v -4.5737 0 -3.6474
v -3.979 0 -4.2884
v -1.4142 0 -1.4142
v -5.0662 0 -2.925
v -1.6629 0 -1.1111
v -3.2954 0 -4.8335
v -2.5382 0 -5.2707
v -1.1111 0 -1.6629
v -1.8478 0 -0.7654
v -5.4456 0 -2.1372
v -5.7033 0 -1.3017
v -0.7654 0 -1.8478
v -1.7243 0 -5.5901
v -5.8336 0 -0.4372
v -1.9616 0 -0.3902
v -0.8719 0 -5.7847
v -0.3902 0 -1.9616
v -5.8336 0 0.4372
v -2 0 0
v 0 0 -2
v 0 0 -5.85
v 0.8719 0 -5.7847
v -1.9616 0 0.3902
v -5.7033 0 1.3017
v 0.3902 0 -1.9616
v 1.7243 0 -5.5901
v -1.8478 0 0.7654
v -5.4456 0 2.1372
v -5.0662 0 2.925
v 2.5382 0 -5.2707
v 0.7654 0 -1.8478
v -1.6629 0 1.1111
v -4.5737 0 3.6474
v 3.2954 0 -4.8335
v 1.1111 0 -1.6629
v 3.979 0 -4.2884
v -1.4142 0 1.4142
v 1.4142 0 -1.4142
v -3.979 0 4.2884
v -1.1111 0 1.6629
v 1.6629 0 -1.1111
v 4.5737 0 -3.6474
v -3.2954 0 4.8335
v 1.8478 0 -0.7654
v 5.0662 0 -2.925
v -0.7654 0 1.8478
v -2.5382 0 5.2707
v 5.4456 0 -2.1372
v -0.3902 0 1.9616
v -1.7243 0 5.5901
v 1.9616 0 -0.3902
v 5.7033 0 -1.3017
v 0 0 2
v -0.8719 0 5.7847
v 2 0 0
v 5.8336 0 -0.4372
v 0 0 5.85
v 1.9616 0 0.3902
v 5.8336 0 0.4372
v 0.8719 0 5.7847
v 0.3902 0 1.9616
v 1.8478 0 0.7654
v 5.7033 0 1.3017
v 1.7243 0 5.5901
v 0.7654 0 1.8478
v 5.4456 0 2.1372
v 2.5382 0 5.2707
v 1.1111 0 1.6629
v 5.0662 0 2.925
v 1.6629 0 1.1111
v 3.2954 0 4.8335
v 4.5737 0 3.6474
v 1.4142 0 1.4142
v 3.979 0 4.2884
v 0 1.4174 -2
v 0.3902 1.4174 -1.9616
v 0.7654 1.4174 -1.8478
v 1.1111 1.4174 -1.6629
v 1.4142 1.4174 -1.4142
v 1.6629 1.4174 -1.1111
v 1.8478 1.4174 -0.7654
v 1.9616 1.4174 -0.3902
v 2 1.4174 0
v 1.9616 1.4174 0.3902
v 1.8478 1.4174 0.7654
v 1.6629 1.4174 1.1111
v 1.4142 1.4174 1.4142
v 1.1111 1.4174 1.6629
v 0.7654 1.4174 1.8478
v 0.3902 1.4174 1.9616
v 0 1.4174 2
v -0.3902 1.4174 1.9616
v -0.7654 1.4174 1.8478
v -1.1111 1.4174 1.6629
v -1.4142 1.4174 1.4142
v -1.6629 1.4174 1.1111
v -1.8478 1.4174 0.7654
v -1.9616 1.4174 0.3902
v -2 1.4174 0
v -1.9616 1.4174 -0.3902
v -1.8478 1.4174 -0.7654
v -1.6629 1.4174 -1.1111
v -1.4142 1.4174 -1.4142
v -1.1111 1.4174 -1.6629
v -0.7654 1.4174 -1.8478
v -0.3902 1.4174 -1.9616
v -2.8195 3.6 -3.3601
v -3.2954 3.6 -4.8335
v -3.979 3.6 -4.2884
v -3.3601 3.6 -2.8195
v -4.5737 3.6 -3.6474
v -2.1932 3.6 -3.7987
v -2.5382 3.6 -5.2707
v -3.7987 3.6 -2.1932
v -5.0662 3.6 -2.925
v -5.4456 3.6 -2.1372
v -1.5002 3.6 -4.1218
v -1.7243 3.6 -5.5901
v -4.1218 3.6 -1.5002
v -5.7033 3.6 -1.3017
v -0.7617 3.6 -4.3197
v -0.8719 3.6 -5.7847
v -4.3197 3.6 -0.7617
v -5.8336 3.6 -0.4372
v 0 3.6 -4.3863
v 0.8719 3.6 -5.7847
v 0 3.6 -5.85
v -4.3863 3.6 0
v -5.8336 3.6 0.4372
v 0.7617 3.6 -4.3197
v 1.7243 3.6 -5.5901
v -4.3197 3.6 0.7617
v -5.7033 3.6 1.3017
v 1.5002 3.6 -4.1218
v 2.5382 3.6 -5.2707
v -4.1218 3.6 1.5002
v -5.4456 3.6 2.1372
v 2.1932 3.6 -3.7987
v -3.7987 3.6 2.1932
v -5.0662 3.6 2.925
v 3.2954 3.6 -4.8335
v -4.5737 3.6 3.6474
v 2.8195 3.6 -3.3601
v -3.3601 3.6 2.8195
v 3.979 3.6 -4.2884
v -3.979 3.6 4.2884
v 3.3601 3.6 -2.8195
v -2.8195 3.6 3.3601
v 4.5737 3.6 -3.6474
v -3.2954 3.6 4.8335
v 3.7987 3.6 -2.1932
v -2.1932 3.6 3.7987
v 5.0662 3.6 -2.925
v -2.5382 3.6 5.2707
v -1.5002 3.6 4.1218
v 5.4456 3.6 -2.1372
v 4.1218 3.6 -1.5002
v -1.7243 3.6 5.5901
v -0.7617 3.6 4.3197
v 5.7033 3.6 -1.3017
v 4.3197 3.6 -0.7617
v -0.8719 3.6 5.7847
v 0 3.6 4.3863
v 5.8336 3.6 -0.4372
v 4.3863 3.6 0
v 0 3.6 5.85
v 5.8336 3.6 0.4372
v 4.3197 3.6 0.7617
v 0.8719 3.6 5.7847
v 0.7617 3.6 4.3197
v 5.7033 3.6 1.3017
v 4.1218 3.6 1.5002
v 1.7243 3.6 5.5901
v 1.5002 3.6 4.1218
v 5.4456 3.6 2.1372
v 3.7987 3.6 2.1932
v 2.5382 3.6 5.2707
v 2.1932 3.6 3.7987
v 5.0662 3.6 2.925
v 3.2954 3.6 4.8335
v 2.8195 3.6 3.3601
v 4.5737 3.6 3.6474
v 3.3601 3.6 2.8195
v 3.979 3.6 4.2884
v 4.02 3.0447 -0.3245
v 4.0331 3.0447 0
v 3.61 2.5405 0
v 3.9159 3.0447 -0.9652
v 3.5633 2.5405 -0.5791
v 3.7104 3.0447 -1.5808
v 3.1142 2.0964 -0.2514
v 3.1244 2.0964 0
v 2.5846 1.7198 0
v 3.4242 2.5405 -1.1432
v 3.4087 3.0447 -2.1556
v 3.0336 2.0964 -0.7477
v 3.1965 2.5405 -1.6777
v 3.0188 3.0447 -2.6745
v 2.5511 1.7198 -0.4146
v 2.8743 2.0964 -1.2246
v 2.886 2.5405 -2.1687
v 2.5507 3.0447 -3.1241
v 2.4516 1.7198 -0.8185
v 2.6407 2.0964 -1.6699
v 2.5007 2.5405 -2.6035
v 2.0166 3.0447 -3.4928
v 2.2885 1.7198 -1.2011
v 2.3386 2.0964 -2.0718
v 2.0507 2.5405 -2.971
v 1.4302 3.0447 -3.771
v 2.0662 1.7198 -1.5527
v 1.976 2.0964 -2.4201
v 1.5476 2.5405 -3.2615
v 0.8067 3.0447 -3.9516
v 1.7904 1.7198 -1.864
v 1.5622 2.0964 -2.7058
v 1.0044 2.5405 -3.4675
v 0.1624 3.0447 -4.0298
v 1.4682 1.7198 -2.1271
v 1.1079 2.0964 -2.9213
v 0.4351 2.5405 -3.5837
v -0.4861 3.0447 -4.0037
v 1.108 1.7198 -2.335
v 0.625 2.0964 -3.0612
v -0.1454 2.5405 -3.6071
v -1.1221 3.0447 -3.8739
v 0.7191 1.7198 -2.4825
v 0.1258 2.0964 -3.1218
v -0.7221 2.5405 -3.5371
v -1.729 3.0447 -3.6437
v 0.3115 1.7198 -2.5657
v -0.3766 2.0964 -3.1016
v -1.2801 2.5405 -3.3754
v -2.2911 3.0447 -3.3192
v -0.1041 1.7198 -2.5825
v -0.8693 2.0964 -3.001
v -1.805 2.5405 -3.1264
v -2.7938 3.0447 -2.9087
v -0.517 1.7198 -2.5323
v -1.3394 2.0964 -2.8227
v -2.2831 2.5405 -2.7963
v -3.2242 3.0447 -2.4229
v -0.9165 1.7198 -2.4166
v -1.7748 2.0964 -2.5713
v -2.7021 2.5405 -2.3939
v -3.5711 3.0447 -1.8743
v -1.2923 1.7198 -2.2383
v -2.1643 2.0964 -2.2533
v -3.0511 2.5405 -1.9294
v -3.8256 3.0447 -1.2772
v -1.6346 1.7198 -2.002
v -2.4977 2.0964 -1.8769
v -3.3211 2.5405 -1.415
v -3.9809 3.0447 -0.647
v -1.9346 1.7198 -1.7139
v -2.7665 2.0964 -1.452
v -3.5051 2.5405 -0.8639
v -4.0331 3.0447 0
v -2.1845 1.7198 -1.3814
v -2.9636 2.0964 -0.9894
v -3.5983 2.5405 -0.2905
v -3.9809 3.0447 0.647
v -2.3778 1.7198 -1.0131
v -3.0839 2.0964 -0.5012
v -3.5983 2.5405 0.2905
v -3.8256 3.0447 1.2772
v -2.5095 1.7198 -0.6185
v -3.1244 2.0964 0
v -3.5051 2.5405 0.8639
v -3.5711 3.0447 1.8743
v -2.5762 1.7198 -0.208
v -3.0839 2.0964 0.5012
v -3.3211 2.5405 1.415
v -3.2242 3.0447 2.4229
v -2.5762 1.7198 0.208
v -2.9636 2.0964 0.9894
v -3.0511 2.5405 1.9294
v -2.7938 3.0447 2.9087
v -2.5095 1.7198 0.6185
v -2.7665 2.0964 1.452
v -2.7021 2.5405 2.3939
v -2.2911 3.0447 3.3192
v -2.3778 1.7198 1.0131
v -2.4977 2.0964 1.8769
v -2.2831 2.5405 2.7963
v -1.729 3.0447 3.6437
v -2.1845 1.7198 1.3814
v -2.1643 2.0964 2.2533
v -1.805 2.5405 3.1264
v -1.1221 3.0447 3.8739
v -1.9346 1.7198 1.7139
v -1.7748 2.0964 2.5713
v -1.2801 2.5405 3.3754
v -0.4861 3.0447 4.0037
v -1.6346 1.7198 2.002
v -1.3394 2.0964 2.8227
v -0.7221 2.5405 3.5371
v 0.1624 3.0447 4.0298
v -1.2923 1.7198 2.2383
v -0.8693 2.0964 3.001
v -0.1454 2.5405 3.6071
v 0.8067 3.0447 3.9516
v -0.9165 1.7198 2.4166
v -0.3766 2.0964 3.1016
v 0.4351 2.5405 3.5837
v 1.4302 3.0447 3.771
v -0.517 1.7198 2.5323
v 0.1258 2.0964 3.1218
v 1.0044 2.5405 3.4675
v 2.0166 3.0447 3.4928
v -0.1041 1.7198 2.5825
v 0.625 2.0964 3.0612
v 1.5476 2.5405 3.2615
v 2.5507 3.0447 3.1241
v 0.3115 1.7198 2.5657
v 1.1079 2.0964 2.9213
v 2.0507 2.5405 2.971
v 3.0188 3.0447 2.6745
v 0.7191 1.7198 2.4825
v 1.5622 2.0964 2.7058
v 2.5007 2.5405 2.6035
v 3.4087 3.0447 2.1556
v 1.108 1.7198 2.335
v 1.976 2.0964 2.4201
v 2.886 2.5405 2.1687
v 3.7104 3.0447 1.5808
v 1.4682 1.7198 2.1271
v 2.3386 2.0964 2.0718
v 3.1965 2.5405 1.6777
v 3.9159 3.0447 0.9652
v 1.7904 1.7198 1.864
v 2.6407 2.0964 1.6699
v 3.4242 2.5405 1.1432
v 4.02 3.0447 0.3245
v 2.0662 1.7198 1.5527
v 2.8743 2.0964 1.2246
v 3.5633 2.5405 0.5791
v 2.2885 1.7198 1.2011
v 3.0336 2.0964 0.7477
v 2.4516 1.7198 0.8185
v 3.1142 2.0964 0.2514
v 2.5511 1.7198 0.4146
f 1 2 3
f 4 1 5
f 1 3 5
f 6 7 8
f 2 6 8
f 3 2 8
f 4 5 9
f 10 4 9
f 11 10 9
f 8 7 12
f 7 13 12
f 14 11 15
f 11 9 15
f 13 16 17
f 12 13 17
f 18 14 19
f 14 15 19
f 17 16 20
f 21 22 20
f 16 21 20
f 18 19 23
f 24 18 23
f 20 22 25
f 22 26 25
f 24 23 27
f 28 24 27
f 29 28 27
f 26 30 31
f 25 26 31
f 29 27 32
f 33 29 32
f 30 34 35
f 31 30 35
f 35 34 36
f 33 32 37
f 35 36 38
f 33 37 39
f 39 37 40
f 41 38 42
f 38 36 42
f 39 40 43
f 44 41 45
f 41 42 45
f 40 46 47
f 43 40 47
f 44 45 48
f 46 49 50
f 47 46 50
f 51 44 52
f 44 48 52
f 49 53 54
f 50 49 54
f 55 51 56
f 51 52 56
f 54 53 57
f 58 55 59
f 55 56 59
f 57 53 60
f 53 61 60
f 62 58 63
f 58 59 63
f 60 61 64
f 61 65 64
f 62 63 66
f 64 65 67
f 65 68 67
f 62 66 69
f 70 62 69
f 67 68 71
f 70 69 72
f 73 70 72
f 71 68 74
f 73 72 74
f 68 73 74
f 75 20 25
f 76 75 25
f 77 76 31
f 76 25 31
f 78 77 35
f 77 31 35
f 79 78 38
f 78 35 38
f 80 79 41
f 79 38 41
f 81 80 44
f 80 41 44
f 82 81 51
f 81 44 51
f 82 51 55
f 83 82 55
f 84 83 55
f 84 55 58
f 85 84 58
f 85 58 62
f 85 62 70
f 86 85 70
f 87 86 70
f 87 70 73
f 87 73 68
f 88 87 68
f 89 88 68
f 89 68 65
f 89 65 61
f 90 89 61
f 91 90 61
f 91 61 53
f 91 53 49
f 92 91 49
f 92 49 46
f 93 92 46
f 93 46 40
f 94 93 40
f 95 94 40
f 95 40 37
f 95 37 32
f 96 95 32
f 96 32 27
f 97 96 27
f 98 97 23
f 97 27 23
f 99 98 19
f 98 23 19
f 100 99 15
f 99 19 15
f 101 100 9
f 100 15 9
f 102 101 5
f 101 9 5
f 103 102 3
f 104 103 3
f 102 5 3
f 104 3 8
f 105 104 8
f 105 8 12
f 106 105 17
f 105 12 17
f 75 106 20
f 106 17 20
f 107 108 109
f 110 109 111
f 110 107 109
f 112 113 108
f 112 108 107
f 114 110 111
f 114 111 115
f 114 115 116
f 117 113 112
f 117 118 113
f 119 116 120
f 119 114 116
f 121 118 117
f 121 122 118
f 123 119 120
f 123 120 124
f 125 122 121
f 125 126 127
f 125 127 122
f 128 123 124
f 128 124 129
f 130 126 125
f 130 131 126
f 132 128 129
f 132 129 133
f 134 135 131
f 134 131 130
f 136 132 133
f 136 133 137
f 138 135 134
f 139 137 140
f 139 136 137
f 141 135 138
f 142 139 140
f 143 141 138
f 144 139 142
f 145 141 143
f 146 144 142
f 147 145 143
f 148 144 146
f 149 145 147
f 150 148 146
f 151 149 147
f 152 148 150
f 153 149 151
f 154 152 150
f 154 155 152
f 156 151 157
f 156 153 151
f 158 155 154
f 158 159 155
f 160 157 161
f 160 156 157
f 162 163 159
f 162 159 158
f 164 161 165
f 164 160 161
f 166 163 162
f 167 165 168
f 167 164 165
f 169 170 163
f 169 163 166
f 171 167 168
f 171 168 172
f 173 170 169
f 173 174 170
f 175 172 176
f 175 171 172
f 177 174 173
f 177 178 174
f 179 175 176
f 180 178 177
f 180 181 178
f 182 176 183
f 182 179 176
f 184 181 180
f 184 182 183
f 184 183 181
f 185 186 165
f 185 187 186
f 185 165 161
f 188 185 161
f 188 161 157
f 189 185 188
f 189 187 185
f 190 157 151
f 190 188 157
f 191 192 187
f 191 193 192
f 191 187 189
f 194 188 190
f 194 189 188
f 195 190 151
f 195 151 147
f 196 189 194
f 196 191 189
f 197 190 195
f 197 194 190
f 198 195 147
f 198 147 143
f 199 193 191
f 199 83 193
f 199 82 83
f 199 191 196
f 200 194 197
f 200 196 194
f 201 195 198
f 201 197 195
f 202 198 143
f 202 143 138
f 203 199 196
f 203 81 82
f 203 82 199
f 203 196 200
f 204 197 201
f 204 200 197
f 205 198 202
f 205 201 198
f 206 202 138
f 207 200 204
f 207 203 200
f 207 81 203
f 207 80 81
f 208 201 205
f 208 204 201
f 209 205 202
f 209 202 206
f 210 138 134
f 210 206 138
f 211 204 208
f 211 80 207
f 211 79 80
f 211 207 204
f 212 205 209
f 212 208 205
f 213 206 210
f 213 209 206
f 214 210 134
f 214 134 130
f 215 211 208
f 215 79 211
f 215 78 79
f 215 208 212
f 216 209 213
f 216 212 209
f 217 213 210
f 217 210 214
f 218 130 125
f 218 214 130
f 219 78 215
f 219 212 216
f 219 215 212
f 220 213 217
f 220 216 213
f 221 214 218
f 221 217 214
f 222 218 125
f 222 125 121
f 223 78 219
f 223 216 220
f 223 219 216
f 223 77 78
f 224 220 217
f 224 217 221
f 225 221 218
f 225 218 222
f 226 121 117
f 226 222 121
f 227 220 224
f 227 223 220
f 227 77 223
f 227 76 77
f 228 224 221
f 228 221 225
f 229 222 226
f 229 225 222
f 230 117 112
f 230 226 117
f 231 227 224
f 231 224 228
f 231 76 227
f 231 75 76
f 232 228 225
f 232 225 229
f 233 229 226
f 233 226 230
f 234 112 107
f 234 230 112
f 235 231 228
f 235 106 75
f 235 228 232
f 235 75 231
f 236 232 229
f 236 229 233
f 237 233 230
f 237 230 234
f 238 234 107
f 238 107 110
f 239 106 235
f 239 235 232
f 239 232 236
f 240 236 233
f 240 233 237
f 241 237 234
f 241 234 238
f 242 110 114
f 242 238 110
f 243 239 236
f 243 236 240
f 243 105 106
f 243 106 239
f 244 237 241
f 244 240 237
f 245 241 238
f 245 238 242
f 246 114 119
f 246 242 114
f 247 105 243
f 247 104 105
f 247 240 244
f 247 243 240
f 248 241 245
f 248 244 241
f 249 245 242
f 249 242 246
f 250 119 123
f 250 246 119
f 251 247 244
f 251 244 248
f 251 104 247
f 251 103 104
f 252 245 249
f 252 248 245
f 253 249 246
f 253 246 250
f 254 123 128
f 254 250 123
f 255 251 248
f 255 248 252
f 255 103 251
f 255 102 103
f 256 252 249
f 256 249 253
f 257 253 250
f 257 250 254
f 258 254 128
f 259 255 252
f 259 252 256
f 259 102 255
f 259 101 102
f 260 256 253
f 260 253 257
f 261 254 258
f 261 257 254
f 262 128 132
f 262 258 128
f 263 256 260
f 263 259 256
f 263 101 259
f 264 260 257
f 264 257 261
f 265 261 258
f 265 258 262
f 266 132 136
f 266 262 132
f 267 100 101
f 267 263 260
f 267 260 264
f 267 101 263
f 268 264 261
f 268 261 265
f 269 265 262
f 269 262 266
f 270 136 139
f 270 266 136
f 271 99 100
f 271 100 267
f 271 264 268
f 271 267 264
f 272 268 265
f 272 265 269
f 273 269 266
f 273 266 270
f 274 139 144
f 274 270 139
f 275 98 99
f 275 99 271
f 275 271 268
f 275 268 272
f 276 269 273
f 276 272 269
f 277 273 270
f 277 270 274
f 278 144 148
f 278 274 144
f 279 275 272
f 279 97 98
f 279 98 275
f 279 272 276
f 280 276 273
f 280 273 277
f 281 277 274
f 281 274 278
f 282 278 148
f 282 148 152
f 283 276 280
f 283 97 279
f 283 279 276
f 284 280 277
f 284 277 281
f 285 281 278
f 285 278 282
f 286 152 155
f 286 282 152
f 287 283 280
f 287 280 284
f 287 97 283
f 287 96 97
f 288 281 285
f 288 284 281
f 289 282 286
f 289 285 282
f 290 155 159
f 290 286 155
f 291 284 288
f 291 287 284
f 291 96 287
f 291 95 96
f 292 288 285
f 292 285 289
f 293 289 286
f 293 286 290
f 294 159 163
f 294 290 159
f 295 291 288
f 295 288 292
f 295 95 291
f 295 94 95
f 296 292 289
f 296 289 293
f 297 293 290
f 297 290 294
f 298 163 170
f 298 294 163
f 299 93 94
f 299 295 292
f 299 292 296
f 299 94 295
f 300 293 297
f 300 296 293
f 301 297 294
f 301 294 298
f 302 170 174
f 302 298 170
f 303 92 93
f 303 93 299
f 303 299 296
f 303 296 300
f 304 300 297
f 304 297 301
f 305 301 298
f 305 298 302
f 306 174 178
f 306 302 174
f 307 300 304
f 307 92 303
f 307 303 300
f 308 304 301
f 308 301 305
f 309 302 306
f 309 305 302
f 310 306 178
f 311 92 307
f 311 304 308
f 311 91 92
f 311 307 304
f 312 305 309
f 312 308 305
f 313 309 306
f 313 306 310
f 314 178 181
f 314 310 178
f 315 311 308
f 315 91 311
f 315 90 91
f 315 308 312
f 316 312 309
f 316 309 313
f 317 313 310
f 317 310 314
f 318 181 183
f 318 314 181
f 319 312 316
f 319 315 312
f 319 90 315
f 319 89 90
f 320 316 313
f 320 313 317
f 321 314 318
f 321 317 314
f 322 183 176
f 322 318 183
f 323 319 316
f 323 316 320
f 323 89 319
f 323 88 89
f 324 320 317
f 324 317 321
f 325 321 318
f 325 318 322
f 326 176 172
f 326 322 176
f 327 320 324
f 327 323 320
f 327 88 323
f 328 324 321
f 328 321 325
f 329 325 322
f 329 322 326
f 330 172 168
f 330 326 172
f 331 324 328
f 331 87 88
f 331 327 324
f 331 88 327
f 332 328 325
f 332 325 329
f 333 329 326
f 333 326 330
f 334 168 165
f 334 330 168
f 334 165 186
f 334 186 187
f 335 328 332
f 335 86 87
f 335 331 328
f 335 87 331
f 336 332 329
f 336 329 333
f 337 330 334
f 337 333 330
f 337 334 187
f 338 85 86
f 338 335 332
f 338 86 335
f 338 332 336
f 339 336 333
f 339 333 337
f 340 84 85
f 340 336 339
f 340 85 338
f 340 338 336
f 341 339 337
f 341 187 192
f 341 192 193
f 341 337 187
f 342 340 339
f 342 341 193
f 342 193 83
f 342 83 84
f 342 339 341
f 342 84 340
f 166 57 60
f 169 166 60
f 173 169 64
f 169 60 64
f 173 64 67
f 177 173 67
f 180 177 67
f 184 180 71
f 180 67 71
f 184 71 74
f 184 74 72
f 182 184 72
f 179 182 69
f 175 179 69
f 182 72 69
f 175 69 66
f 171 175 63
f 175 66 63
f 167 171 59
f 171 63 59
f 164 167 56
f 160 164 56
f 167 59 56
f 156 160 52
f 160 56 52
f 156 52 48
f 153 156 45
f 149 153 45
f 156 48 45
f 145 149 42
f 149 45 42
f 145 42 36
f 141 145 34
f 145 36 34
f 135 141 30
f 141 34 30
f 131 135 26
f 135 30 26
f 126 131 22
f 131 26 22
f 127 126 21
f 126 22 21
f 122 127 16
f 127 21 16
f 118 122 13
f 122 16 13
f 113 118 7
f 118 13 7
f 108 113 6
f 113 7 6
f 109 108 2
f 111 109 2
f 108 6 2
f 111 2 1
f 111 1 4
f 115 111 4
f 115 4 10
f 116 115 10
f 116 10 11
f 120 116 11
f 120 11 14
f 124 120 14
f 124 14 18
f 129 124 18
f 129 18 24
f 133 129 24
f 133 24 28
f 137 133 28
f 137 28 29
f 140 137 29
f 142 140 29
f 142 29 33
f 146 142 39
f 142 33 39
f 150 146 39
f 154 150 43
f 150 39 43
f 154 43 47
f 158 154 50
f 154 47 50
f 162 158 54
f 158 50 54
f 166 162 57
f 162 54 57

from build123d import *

# Parameters (mm, degrees)
SKETCH1_R           = 5.85
BOSS_EXTRUDE1_DEPTH = 3.6
SKETCH3_R           = 2
CUT_EXTRUDE1_DEPTH  = 4


with BuildPart() as part:
    # Sketch1 → Boss-Extrude1 (new body)
    with BuildSketch(Plane(origin=(0, 0, 0), x_dir=(1, 0, 0), z_dir=(0, 1, 0))):
        with Locations(Location((0, 0, 0), (0, 0, 270))):
            Circle(SKETCH1_R)
    extrude(amount=BOSS_EXTRUDE1_DEPTH)

    # Sketch2 → Cut-Revolve1 (revolve, cut)
    with BuildSketch(Plane.XY):
        with BuildLine():
            Line((0, 1), (0, 11))
            ThreePointArc((0, 11), (5, 6), (0, 1))
        make_face()
    revolve(axis=Axis((0, 1, 0), (0, 1, 0)), mode=Mode.SUBTRACT)

    # Sketch3 → Cut-Extrude1 (cut)
    with BuildSketch(Plane.XZ):
        with Locations(Location((0, 0, 0), (0, 0, 270))):
            Circle(SKETCH3_R)
    extrude(amount=-CUT_EXTRUDE1_DEPTH, mode=Mode.SUBTRACT)


solid = part.part
